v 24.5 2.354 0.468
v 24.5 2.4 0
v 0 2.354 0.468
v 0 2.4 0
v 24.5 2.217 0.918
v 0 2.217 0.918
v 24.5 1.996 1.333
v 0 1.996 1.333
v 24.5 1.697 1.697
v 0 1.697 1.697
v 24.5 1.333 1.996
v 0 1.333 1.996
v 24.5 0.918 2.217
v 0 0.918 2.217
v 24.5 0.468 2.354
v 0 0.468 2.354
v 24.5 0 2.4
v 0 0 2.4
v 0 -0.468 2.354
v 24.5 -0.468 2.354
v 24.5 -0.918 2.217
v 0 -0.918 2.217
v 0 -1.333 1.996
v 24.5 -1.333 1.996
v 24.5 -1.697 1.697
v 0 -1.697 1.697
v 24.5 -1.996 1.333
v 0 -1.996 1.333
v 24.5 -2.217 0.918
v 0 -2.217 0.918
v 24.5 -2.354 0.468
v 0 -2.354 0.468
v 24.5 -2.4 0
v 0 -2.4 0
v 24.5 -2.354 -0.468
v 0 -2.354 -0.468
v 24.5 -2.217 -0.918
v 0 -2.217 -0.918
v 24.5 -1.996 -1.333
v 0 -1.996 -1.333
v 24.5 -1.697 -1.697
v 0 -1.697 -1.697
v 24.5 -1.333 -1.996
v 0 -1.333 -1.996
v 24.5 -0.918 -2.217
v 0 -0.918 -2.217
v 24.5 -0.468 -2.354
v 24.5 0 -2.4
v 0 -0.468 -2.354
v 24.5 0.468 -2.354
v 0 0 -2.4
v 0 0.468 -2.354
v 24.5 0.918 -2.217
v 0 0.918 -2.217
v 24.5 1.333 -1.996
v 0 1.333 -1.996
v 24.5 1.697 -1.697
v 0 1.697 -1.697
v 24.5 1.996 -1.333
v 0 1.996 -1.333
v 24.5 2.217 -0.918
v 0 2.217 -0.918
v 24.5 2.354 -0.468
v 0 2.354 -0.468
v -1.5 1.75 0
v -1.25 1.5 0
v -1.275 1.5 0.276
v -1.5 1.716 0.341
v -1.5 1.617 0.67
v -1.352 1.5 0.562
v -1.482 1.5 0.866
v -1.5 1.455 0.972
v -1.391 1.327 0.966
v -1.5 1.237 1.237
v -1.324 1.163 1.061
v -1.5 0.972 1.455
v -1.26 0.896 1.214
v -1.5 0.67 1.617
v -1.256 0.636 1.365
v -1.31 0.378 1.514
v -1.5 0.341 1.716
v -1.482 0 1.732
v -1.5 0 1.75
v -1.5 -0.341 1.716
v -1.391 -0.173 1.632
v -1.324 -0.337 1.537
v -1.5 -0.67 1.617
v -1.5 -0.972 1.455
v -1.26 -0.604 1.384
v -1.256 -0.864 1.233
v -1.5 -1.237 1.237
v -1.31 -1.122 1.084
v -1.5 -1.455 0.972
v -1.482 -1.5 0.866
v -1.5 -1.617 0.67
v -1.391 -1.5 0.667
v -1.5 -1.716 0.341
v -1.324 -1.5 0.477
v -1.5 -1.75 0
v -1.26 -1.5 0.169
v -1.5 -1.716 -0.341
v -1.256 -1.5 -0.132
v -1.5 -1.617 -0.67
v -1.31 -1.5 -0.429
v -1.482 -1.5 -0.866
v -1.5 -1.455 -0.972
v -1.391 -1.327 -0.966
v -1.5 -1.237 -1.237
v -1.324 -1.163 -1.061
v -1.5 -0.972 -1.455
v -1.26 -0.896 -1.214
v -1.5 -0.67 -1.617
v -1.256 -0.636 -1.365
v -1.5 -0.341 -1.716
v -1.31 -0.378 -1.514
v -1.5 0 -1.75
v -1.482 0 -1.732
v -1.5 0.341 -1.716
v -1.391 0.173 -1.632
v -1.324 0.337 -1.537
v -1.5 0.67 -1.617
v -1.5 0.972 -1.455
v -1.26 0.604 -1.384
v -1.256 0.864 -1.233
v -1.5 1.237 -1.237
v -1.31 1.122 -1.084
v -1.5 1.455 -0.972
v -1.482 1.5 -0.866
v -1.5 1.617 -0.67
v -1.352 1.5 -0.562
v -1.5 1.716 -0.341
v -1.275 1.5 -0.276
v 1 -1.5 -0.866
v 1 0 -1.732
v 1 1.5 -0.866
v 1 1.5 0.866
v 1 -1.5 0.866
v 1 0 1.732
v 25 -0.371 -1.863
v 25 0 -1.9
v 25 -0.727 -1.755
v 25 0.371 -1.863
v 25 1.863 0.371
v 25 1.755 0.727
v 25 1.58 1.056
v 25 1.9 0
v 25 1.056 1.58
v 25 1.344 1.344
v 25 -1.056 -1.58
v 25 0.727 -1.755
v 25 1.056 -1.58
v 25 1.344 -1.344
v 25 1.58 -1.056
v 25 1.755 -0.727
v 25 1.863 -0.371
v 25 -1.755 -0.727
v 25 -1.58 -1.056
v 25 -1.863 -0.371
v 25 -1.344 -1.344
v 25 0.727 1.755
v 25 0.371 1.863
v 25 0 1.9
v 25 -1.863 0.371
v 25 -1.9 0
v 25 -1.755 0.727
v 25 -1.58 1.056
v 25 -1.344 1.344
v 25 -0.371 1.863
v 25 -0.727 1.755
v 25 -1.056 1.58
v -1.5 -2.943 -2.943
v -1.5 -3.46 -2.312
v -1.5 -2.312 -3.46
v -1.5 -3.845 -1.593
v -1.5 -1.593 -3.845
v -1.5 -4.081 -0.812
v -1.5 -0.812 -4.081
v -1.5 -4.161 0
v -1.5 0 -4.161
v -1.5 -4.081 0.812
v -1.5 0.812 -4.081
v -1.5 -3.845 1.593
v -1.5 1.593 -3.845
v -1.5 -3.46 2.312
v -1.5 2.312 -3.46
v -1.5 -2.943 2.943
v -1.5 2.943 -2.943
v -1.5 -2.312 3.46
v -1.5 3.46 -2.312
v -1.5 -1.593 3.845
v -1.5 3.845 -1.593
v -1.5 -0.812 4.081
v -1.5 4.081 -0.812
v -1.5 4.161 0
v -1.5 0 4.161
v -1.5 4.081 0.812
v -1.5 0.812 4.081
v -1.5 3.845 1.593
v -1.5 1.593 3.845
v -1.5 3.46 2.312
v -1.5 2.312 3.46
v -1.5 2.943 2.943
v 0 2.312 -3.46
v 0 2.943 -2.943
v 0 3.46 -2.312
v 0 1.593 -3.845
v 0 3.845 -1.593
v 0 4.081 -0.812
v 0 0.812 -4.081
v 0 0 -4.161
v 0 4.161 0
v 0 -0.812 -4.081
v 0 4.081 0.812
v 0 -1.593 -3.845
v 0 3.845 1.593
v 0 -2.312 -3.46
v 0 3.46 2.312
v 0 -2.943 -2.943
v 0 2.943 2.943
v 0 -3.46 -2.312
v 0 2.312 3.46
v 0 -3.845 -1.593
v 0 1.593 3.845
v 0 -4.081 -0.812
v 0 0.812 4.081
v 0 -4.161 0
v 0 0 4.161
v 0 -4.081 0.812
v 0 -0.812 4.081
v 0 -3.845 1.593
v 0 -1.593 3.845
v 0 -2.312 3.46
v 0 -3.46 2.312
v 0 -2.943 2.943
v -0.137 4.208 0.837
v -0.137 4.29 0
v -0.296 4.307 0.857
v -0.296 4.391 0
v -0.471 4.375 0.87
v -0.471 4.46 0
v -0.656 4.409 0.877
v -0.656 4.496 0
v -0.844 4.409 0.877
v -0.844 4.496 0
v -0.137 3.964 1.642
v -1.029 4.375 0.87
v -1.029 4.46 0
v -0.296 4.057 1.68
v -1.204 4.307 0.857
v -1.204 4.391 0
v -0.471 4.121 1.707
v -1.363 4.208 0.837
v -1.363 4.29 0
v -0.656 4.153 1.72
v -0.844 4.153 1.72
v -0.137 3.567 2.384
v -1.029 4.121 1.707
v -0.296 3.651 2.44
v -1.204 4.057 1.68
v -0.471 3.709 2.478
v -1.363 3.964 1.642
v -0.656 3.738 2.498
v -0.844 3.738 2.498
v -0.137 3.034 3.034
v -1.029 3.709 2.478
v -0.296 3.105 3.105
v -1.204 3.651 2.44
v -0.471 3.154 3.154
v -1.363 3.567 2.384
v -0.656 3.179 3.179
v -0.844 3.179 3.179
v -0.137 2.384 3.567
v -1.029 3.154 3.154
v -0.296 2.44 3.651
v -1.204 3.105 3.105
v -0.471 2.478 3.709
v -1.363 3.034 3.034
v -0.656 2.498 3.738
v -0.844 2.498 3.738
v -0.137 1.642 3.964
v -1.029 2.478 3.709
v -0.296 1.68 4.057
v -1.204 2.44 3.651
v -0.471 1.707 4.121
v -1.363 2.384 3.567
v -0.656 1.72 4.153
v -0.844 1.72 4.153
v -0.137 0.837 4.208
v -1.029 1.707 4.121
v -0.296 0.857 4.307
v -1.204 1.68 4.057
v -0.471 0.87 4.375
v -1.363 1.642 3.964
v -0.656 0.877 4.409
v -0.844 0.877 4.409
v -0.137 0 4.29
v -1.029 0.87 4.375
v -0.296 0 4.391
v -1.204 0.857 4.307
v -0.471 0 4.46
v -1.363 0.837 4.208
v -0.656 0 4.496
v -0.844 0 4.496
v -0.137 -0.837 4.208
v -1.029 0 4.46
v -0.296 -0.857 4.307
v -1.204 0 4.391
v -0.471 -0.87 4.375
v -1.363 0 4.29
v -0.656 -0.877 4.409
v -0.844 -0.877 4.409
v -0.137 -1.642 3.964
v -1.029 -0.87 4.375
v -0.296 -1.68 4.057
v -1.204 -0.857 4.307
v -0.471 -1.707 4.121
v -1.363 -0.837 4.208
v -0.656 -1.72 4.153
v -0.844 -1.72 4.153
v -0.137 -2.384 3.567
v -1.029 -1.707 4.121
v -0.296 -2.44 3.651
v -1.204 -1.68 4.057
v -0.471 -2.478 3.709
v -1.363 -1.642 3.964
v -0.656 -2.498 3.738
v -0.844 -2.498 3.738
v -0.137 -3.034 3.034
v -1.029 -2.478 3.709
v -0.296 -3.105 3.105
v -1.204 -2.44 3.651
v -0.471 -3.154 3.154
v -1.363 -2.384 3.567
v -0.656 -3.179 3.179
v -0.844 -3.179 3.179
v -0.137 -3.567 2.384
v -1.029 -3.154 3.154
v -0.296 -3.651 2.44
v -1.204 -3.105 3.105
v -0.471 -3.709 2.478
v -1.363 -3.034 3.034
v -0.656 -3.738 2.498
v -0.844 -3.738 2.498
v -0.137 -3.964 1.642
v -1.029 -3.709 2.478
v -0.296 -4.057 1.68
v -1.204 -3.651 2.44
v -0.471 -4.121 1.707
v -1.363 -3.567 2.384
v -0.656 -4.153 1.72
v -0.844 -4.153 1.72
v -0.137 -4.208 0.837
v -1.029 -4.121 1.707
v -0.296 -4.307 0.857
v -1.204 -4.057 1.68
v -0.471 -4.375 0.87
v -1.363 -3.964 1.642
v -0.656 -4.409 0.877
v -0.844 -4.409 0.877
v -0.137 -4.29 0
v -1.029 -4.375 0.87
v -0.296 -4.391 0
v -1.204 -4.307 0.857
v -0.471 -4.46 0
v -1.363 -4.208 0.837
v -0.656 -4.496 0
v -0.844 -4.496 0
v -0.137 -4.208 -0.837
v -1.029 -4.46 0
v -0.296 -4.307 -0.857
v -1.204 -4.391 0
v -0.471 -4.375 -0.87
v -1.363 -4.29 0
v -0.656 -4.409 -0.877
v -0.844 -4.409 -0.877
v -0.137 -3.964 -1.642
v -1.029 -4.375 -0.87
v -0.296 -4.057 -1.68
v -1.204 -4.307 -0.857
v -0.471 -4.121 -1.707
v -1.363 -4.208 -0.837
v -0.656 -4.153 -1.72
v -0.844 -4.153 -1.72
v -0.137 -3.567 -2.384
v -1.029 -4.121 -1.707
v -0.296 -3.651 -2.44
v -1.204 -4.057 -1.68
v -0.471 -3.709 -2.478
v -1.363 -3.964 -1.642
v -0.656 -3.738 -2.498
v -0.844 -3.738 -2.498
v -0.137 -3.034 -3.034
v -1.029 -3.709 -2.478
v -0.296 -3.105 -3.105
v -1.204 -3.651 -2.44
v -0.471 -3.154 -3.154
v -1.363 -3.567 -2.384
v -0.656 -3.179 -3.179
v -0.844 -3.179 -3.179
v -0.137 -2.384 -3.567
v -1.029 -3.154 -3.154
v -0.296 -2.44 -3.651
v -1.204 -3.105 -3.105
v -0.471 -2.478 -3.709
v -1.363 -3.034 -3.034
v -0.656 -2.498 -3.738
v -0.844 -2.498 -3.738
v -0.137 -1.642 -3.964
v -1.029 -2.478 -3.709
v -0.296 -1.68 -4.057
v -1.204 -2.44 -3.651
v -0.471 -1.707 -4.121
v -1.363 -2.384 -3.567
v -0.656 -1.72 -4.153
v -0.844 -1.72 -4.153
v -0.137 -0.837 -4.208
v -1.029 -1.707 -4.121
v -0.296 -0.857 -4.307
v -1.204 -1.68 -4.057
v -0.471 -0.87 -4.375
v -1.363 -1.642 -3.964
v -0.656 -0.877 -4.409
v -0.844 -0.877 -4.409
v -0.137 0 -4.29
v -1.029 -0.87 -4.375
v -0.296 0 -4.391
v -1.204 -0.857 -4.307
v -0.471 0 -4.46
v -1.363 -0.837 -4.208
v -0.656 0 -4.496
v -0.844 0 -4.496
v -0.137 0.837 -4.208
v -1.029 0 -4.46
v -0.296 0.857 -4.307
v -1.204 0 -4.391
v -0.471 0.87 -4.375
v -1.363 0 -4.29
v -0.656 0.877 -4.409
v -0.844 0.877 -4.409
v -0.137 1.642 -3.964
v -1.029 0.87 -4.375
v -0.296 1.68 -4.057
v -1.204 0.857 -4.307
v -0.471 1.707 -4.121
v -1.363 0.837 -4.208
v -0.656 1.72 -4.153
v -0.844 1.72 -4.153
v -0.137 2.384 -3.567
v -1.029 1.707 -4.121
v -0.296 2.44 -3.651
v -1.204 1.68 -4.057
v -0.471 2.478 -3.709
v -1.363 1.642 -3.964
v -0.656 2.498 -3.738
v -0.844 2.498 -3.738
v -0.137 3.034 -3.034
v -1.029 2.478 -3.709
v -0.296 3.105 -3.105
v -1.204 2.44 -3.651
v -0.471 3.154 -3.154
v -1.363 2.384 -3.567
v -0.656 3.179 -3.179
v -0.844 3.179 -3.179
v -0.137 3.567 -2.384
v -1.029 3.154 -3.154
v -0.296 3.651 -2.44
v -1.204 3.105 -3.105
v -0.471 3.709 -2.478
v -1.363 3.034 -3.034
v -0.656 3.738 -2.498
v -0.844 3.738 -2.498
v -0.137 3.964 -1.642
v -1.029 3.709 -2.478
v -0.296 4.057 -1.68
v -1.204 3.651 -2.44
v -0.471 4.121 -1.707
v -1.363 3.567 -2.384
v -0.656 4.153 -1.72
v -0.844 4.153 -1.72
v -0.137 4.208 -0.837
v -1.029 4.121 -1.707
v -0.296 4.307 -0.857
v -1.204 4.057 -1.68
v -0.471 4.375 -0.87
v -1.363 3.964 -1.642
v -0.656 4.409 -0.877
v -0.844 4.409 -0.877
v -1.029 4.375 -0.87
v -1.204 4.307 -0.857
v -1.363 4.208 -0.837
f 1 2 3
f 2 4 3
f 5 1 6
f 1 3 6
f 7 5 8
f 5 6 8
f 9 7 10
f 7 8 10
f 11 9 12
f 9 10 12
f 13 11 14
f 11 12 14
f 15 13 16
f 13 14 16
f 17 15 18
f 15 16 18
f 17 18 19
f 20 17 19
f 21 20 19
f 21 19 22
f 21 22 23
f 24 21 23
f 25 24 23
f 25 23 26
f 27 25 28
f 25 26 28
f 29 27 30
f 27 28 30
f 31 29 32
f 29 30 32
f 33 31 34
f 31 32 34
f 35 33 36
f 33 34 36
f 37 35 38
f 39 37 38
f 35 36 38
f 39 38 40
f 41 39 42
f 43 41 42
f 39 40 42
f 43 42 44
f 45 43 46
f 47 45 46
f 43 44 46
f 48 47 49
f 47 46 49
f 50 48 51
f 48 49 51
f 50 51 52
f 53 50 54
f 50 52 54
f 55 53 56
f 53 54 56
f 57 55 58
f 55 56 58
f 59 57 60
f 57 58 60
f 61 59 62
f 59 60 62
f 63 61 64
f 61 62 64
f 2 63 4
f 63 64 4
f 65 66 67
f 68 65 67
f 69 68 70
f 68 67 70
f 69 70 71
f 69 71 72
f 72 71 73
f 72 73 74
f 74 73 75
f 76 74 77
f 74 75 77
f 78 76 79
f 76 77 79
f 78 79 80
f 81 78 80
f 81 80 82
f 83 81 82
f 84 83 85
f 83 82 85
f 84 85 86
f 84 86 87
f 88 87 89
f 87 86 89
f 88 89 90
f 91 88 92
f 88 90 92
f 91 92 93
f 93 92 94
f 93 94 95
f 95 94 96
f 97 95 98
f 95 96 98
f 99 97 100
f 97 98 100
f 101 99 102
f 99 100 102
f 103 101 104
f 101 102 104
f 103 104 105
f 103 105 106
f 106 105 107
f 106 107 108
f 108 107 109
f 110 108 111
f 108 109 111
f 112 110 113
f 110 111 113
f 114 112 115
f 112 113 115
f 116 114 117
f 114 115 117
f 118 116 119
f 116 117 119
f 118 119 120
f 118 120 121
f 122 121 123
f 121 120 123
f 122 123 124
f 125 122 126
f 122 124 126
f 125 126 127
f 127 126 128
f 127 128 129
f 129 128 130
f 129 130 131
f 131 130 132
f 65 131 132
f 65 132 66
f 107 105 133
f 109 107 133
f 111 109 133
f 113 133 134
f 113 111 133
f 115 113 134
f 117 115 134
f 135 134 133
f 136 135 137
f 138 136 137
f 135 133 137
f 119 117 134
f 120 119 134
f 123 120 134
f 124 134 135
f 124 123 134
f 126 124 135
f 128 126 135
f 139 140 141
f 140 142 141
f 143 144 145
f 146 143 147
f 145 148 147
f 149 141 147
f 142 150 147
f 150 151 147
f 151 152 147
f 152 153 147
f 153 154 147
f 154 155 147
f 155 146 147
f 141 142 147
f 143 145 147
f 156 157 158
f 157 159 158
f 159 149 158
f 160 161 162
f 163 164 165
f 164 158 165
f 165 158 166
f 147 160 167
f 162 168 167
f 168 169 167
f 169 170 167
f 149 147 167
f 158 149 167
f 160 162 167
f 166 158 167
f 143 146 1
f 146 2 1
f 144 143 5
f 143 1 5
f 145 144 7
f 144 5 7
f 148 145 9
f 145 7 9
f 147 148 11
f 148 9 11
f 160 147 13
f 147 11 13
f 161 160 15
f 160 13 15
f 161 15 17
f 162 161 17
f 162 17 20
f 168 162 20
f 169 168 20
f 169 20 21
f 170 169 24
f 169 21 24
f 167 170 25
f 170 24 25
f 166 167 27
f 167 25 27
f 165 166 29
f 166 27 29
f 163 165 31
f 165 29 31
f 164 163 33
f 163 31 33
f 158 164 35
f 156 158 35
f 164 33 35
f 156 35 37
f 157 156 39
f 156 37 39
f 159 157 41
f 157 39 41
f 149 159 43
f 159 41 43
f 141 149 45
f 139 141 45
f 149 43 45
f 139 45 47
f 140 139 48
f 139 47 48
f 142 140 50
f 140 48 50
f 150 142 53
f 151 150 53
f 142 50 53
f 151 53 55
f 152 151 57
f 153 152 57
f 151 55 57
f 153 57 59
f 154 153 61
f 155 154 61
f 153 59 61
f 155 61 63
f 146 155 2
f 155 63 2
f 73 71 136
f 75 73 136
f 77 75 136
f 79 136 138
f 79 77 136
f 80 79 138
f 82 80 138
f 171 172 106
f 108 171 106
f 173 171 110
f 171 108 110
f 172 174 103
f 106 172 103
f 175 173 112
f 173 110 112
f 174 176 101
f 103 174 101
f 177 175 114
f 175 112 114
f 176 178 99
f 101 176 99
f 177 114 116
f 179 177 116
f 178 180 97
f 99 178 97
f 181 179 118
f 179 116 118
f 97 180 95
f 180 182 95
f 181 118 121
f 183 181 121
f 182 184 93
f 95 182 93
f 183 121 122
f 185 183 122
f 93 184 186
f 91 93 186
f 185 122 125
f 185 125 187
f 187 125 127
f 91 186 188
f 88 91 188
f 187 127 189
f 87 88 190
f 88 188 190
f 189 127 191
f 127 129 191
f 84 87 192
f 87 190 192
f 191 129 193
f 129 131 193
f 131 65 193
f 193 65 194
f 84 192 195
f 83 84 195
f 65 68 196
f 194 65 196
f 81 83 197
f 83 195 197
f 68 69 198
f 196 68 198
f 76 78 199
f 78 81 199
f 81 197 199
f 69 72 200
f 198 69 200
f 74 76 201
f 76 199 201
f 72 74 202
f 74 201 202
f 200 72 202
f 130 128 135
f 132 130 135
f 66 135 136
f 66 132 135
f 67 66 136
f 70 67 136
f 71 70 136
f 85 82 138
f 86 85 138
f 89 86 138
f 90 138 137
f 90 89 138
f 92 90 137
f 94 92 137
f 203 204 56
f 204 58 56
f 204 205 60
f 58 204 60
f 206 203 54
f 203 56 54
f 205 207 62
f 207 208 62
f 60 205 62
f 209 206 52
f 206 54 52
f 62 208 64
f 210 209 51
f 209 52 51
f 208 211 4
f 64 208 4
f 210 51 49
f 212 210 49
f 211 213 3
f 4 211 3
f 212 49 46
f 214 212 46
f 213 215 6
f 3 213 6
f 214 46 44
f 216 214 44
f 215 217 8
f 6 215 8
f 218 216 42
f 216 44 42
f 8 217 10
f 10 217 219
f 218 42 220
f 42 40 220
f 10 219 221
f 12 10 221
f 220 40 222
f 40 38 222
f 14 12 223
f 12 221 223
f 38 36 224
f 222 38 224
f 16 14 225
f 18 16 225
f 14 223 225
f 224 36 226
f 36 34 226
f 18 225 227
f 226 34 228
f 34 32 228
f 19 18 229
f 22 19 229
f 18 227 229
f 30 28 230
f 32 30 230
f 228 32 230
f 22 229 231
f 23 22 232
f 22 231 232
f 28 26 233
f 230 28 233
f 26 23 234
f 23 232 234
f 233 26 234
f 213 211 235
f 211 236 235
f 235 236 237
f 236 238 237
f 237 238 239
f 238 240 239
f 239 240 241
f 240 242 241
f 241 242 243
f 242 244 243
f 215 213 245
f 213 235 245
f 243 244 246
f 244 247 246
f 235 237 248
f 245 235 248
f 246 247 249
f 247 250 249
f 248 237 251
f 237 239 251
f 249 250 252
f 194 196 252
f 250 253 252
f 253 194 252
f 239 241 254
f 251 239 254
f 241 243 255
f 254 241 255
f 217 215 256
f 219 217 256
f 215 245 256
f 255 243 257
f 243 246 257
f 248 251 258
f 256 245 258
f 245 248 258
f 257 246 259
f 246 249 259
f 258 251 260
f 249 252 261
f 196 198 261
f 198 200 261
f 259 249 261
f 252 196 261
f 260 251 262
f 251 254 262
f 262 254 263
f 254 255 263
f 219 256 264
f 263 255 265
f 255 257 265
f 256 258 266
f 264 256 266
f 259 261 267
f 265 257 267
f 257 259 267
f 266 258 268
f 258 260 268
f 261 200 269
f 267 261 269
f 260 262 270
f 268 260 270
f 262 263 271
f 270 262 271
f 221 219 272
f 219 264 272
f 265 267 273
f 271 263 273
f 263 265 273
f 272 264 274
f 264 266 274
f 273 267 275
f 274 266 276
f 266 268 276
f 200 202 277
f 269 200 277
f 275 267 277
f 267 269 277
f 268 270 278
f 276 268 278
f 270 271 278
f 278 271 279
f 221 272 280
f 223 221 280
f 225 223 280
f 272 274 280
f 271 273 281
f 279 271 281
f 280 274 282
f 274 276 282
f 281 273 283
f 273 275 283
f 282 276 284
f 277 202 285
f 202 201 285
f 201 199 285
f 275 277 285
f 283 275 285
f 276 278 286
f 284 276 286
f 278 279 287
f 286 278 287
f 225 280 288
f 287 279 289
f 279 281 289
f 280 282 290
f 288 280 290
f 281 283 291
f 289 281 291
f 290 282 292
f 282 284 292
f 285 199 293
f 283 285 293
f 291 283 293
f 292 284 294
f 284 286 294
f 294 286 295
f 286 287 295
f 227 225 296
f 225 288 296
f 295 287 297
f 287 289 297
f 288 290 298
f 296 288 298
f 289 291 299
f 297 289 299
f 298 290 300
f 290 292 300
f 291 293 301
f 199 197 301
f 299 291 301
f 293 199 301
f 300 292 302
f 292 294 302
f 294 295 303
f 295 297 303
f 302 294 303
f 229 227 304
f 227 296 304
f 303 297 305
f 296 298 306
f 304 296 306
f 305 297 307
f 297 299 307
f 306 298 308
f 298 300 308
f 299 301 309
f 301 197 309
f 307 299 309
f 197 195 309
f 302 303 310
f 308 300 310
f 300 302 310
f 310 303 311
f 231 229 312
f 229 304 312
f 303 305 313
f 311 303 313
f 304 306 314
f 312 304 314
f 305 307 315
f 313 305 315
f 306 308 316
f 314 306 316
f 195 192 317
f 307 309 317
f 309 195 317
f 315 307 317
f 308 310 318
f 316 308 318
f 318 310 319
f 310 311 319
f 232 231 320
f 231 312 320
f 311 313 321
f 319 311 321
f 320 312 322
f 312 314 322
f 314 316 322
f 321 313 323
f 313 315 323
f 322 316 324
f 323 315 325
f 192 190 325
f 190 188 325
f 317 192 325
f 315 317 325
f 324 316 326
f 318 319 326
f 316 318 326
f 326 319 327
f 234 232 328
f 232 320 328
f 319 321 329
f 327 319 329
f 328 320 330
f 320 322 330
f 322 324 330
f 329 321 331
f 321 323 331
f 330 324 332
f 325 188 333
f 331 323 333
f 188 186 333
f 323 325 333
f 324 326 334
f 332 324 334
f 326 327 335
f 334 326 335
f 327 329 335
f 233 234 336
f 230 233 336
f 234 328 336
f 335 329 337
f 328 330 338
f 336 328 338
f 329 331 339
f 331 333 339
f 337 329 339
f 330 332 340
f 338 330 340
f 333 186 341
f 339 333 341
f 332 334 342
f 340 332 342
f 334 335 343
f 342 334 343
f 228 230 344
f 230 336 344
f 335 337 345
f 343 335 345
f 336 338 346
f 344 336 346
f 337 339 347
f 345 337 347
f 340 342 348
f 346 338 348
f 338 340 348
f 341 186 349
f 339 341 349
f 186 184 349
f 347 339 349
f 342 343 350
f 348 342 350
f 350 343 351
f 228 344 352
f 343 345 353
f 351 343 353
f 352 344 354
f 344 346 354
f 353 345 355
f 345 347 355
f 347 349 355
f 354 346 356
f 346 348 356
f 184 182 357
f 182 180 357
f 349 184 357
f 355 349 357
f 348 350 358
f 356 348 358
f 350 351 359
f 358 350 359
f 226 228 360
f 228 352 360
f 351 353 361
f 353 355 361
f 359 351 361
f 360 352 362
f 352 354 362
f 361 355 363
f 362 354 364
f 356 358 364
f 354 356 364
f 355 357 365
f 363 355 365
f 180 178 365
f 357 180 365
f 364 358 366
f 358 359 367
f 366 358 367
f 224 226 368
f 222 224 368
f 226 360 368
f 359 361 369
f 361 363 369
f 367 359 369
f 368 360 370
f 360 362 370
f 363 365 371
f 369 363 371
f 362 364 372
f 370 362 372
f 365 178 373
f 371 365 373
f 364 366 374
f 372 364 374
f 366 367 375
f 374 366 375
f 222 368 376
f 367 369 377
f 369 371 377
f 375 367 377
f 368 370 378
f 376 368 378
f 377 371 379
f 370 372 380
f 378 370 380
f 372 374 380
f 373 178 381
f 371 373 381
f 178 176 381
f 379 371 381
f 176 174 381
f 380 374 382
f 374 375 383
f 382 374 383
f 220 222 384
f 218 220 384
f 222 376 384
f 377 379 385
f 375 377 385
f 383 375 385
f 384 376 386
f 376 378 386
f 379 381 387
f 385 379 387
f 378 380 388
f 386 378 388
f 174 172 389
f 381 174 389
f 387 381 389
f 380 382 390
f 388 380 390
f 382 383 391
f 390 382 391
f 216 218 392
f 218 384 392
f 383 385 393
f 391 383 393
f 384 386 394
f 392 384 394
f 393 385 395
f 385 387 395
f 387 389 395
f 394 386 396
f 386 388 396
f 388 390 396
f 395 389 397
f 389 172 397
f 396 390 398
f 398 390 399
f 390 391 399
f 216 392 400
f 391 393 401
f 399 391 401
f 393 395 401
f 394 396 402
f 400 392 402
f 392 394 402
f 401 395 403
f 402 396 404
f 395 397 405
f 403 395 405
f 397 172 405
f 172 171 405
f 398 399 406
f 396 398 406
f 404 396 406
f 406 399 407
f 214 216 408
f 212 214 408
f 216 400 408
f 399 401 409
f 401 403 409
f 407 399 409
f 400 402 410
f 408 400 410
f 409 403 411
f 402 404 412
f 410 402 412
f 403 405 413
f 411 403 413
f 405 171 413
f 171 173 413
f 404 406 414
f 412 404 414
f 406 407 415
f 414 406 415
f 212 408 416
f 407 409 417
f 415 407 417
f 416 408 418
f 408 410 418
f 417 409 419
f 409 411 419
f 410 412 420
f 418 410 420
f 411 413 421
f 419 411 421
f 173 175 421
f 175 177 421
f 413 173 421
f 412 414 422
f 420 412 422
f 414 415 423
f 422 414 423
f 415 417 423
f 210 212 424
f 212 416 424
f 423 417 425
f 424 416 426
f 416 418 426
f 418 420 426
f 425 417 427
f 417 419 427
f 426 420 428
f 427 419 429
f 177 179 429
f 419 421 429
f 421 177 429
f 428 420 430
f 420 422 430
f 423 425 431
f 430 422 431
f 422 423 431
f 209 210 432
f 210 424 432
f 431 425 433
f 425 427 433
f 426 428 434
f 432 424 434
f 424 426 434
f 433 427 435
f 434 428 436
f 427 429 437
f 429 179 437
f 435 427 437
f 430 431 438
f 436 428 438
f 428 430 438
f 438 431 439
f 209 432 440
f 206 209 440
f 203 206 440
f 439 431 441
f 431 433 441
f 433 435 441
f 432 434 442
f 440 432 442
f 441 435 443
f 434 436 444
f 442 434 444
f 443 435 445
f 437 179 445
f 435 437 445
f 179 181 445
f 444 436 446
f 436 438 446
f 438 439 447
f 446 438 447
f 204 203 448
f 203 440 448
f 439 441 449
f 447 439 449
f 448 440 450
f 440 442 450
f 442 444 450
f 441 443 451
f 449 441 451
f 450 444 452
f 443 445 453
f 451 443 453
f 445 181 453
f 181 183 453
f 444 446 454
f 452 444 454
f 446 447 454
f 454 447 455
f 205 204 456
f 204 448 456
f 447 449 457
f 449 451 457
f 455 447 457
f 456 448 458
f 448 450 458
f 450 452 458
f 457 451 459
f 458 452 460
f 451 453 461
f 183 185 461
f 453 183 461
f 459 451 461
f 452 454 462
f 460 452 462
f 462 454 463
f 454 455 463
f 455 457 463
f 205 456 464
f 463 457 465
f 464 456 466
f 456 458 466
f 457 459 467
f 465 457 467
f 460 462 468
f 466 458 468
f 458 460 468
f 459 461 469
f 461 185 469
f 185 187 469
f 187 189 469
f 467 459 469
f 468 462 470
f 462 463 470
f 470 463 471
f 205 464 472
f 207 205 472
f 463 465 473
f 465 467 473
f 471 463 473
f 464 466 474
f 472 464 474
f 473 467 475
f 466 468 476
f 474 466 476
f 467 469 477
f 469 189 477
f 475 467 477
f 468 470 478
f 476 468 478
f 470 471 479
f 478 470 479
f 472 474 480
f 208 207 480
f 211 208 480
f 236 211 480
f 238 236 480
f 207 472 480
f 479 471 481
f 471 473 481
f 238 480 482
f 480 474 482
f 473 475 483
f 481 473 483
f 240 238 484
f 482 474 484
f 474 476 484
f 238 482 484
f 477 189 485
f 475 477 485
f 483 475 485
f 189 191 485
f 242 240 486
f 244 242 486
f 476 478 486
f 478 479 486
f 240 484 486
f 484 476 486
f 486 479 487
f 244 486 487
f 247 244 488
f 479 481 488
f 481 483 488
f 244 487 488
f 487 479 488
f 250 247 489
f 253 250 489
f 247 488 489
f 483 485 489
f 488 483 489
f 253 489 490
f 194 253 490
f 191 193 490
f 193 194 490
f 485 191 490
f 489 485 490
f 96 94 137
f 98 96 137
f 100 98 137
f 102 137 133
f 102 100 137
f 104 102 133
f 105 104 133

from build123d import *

# Parameters (mm, degrees)
PRISM_DEPTH = 2.5


with BuildPart() as part:
    # Sketch_002 → Revolution (revolve)
    with BuildSketch(Plane.XY):
        with BuildLine():
            Line((-1.5, 4.161438), (-1.5, 1.75))
            Line((-1.5, 1.75), (0.25, 0))
            Line((0.25, 0), (25, 0))
            Line((25, 0), (25, 1.9))
            Line((25, 1.9), (24.5, 2.4))
            Line((24.5, 2.4), (0, 2.4))
            Line((0, 2.4), (0, 4.161438))
            ThreePointArc((0, 4.161438), (-0.75, 4.5), (-1.5, 4.161438))
        make_face()
    revolve(axis=Axis((0, 0, 0), (1, 0, 0)))

    # Prism → Prism (cut)
    with BuildSketch(Plane(origin=(-1.5, 0, 0), x_dir=(0, 0, 1), z_dir=(1, 0, 0))):
        Polygon((1.732051, 0), (0.866025, 1.5), (-0.866025, 1.5), (-1.732051, 0), (-0.866025, -1.5), (0.866025, -1.5), align=None)
    extrude(amount=PRISM_DEPTH, mode=Mode.SUBTRACT)


solid = part.part
